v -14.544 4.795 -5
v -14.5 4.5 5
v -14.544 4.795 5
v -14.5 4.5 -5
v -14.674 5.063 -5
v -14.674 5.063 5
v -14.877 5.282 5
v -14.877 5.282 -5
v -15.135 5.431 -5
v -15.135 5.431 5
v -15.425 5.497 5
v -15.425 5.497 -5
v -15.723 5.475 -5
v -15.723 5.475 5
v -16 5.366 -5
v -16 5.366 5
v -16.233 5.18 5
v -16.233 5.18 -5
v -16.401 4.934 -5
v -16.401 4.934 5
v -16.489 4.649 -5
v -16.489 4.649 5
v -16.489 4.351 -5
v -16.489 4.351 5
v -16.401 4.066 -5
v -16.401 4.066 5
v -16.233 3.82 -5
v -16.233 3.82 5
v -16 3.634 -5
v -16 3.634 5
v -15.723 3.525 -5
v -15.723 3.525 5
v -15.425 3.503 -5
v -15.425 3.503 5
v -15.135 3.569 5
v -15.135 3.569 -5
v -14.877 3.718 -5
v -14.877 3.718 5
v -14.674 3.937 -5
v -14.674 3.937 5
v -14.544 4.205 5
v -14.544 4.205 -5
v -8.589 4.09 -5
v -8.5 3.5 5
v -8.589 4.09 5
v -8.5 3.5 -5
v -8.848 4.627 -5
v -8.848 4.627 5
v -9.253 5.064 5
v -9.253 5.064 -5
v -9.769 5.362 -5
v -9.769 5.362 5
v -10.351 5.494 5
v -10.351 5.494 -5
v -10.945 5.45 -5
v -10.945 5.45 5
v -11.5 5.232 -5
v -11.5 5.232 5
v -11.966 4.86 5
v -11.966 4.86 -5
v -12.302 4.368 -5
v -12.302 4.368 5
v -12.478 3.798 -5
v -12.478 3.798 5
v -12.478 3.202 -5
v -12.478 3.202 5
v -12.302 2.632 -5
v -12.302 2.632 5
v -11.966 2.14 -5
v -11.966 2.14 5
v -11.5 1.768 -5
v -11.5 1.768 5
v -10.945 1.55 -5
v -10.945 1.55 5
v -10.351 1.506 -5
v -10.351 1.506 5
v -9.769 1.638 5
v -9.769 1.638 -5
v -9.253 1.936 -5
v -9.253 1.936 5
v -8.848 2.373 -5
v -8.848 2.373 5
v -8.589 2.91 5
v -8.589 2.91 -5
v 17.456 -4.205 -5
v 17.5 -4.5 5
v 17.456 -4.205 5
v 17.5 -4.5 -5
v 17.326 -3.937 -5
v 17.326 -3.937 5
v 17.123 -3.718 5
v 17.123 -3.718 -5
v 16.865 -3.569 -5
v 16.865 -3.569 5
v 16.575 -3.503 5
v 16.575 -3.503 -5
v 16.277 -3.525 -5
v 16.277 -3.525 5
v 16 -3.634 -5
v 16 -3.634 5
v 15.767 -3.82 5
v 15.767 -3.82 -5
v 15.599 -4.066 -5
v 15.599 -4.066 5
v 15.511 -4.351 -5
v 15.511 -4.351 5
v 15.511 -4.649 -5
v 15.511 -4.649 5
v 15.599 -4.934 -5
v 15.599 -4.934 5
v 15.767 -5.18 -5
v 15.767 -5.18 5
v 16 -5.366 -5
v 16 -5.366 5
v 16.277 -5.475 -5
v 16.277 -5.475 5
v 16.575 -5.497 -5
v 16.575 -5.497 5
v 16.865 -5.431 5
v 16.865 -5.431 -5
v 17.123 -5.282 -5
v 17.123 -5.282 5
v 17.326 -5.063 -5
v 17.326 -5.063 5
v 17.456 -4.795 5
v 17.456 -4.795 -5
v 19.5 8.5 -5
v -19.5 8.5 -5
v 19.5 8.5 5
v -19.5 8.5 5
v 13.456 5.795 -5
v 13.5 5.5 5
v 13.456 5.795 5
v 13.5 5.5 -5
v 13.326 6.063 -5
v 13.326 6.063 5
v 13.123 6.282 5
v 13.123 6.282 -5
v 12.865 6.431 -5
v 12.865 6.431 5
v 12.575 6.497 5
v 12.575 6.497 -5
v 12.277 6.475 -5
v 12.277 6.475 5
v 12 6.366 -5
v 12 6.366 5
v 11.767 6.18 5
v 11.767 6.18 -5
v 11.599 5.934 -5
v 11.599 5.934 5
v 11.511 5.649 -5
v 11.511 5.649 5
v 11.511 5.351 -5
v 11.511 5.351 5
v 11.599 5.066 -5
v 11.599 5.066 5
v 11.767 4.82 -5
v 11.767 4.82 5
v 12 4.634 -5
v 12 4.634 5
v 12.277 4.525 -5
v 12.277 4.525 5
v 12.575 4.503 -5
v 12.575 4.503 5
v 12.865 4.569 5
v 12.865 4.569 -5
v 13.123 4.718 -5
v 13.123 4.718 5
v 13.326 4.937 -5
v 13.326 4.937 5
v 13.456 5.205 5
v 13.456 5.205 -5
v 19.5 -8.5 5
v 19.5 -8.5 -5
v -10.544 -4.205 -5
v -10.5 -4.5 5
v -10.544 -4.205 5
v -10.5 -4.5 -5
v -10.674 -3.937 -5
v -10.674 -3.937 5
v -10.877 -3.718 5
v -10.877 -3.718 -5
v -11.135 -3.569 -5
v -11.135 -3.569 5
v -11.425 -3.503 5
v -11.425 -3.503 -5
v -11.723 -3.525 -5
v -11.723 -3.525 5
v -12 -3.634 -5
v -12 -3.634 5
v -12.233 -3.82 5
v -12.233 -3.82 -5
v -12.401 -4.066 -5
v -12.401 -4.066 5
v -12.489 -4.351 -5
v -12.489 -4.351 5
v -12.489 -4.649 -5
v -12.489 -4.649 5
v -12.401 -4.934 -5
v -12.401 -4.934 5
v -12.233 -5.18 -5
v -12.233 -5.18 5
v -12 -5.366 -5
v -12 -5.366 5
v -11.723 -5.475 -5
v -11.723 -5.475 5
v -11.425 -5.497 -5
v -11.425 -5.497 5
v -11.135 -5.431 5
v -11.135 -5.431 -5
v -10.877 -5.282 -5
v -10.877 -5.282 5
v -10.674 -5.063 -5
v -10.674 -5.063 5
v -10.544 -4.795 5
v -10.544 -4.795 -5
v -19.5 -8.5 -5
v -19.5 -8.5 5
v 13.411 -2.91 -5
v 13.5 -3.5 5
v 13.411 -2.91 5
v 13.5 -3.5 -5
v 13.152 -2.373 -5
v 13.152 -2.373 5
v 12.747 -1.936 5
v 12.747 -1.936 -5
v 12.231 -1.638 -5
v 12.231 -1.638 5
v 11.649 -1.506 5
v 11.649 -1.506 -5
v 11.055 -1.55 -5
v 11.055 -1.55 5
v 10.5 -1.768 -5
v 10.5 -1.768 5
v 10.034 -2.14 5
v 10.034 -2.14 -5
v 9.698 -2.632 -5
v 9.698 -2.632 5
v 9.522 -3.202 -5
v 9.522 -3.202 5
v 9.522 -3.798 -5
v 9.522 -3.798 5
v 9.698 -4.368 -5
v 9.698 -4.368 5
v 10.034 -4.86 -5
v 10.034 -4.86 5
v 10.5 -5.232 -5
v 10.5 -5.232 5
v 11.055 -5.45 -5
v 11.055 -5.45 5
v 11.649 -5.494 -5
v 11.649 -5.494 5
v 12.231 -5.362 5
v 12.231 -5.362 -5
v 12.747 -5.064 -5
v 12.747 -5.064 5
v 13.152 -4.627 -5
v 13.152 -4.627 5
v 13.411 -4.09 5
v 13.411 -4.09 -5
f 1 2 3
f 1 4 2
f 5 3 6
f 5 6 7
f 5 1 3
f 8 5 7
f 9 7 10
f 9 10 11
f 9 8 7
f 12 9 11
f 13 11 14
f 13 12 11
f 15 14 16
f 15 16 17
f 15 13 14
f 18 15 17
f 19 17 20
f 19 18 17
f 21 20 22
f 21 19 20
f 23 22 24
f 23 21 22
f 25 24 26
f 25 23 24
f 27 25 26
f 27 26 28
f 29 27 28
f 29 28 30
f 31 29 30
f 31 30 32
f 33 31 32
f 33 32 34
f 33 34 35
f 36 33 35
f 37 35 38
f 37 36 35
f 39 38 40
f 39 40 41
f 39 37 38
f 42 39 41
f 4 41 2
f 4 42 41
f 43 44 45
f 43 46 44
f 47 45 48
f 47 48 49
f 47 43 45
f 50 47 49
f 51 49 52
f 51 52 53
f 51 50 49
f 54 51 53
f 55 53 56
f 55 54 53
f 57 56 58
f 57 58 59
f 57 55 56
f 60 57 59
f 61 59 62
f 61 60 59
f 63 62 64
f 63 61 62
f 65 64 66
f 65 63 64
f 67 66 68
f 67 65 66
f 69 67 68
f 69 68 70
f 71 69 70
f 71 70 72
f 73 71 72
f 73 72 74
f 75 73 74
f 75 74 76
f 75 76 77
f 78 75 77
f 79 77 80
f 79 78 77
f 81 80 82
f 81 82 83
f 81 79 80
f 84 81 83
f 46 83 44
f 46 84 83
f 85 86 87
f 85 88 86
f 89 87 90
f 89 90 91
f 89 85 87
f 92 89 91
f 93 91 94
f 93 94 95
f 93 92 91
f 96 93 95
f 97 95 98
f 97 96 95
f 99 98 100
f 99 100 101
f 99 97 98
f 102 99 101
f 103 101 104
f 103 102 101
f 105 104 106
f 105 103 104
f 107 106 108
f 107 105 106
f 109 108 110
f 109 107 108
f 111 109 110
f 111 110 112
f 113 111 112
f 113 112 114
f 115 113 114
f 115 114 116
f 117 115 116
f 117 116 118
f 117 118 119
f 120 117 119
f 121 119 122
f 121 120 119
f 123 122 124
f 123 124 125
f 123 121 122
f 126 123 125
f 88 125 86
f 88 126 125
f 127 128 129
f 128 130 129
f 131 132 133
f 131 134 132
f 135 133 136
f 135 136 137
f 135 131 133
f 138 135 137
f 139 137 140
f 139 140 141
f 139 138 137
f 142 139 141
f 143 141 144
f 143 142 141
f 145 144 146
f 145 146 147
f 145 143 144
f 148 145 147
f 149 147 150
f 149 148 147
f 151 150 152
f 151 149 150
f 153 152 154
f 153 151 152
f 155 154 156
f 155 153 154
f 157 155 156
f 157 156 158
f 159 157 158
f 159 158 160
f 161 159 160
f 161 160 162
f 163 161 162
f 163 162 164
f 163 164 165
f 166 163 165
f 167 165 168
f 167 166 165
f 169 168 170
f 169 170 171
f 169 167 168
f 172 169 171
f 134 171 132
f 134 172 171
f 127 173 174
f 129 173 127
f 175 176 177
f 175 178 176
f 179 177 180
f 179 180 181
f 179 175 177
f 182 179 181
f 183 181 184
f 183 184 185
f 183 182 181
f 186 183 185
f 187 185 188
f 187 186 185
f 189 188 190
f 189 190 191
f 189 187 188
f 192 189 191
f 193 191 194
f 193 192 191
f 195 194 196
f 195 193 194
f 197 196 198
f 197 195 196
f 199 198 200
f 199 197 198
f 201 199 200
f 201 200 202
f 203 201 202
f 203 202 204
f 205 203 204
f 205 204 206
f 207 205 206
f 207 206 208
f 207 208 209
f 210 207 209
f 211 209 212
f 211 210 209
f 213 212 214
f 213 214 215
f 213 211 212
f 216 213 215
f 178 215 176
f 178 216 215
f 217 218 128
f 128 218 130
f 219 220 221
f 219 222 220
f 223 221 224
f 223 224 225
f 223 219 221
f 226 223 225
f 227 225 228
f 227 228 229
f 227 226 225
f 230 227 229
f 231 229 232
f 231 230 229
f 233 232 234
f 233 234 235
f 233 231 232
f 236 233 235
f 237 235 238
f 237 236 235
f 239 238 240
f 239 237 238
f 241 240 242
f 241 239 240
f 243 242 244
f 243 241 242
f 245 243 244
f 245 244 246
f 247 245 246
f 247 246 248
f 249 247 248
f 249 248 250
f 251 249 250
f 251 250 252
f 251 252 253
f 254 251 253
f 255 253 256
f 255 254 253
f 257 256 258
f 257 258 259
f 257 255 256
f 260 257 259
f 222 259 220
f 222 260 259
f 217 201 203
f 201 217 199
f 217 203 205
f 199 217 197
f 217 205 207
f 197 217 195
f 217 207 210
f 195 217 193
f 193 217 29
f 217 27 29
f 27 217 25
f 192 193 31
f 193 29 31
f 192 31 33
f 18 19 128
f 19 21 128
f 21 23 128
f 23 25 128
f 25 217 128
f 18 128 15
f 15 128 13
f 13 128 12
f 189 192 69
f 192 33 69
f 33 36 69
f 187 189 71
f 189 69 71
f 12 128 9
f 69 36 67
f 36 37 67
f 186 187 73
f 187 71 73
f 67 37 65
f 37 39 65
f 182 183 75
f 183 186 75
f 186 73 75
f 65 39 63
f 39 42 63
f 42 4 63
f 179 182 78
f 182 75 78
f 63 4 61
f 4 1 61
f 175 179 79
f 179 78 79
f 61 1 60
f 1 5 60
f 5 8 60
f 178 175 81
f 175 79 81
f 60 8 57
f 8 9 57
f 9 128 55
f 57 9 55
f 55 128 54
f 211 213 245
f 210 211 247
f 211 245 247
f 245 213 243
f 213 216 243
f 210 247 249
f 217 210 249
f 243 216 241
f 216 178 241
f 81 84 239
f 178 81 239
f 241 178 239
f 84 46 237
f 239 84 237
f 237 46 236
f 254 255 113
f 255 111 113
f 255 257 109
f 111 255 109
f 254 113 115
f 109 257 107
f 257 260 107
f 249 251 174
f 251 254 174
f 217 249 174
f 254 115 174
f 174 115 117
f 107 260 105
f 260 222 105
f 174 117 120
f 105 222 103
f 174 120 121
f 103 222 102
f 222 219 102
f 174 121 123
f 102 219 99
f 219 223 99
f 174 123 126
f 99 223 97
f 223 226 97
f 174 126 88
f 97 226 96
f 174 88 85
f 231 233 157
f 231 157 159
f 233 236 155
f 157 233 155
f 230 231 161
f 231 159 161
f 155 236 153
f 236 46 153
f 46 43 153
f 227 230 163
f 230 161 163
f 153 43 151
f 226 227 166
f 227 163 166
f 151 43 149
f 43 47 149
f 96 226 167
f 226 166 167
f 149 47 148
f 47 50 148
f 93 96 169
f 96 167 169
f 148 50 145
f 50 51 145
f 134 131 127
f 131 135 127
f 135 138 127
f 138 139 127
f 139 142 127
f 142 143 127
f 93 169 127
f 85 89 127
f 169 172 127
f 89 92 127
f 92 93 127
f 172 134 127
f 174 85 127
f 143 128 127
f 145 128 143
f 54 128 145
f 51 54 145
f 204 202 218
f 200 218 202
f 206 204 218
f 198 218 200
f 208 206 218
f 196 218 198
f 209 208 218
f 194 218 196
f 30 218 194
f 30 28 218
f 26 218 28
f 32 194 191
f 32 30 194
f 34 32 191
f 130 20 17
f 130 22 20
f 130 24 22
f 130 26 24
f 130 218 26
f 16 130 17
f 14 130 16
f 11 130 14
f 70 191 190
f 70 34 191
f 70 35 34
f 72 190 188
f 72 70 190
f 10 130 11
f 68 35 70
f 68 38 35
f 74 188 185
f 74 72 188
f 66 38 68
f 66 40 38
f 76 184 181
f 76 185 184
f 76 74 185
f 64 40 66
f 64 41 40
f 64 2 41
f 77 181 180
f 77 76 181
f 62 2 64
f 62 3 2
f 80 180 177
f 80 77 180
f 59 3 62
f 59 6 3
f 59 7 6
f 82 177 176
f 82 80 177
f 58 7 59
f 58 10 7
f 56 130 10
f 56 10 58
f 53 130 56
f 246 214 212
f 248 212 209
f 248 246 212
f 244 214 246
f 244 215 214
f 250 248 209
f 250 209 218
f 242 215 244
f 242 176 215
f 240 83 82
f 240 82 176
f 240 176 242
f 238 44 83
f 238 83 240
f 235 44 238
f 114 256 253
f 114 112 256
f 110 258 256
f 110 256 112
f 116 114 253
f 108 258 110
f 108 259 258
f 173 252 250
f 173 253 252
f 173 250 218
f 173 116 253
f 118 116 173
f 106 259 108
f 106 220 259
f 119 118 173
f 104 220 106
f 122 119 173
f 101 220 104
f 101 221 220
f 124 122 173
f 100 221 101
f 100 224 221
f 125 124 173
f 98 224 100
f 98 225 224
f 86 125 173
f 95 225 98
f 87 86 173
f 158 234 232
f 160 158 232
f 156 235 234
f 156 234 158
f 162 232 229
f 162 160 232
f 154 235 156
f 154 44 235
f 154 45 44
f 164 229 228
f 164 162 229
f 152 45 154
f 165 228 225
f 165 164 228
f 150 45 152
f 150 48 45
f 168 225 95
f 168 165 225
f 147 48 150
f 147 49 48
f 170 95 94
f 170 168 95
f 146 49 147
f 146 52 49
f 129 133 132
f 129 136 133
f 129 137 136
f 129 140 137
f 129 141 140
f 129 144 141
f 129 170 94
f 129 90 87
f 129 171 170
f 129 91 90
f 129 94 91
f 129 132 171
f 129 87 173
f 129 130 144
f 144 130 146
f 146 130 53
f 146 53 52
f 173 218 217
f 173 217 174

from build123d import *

# Parameters (mm, degrees)
SKETCH1_W           = 39
SKETCH1_H           = 17
SKETCH1_R           = 2
SKETCH1_R_2         = 1
BOSS_EXTRUDE1_DEPTH = 5


with BuildPart() as part:
    # Sketch1 → Boss-Extrude1 (new, symmetric)
    with BuildSketch(Plane.XY):
        Rectangle(SKETCH1_W, SKETCH1_H)
        with Locations((-10.5, 3.5)):
            Circle(SKETCH1_R, mode=Mode.SUBTRACT)
        with Locations((-15.5, 4.5)):
            Circle(SKETCH1_R_2, mode=Mode.SUBTRACT)
        with Locations((-11.5, -4.5)):
            Circle(SKETCH1_R_2, mode=Mode.SUBTRACT)
        with Locations((11.5, -3.5)):
            Circle(SKETCH1_R, mode=Mode.SUBTRACT)
        with Locations((12.5, 5.5)):
            Circle(SKETCH1_R_2, mode=Mode.SUBTRACT)
        with Locations((16.5, -4.5)):
            Circle(SKETCH1_R_2, mode=Mode.SUBTRACT)
    extrude(amount=BOSS_EXTRUDE1_DEPTH, both=True)


solid = part.part
